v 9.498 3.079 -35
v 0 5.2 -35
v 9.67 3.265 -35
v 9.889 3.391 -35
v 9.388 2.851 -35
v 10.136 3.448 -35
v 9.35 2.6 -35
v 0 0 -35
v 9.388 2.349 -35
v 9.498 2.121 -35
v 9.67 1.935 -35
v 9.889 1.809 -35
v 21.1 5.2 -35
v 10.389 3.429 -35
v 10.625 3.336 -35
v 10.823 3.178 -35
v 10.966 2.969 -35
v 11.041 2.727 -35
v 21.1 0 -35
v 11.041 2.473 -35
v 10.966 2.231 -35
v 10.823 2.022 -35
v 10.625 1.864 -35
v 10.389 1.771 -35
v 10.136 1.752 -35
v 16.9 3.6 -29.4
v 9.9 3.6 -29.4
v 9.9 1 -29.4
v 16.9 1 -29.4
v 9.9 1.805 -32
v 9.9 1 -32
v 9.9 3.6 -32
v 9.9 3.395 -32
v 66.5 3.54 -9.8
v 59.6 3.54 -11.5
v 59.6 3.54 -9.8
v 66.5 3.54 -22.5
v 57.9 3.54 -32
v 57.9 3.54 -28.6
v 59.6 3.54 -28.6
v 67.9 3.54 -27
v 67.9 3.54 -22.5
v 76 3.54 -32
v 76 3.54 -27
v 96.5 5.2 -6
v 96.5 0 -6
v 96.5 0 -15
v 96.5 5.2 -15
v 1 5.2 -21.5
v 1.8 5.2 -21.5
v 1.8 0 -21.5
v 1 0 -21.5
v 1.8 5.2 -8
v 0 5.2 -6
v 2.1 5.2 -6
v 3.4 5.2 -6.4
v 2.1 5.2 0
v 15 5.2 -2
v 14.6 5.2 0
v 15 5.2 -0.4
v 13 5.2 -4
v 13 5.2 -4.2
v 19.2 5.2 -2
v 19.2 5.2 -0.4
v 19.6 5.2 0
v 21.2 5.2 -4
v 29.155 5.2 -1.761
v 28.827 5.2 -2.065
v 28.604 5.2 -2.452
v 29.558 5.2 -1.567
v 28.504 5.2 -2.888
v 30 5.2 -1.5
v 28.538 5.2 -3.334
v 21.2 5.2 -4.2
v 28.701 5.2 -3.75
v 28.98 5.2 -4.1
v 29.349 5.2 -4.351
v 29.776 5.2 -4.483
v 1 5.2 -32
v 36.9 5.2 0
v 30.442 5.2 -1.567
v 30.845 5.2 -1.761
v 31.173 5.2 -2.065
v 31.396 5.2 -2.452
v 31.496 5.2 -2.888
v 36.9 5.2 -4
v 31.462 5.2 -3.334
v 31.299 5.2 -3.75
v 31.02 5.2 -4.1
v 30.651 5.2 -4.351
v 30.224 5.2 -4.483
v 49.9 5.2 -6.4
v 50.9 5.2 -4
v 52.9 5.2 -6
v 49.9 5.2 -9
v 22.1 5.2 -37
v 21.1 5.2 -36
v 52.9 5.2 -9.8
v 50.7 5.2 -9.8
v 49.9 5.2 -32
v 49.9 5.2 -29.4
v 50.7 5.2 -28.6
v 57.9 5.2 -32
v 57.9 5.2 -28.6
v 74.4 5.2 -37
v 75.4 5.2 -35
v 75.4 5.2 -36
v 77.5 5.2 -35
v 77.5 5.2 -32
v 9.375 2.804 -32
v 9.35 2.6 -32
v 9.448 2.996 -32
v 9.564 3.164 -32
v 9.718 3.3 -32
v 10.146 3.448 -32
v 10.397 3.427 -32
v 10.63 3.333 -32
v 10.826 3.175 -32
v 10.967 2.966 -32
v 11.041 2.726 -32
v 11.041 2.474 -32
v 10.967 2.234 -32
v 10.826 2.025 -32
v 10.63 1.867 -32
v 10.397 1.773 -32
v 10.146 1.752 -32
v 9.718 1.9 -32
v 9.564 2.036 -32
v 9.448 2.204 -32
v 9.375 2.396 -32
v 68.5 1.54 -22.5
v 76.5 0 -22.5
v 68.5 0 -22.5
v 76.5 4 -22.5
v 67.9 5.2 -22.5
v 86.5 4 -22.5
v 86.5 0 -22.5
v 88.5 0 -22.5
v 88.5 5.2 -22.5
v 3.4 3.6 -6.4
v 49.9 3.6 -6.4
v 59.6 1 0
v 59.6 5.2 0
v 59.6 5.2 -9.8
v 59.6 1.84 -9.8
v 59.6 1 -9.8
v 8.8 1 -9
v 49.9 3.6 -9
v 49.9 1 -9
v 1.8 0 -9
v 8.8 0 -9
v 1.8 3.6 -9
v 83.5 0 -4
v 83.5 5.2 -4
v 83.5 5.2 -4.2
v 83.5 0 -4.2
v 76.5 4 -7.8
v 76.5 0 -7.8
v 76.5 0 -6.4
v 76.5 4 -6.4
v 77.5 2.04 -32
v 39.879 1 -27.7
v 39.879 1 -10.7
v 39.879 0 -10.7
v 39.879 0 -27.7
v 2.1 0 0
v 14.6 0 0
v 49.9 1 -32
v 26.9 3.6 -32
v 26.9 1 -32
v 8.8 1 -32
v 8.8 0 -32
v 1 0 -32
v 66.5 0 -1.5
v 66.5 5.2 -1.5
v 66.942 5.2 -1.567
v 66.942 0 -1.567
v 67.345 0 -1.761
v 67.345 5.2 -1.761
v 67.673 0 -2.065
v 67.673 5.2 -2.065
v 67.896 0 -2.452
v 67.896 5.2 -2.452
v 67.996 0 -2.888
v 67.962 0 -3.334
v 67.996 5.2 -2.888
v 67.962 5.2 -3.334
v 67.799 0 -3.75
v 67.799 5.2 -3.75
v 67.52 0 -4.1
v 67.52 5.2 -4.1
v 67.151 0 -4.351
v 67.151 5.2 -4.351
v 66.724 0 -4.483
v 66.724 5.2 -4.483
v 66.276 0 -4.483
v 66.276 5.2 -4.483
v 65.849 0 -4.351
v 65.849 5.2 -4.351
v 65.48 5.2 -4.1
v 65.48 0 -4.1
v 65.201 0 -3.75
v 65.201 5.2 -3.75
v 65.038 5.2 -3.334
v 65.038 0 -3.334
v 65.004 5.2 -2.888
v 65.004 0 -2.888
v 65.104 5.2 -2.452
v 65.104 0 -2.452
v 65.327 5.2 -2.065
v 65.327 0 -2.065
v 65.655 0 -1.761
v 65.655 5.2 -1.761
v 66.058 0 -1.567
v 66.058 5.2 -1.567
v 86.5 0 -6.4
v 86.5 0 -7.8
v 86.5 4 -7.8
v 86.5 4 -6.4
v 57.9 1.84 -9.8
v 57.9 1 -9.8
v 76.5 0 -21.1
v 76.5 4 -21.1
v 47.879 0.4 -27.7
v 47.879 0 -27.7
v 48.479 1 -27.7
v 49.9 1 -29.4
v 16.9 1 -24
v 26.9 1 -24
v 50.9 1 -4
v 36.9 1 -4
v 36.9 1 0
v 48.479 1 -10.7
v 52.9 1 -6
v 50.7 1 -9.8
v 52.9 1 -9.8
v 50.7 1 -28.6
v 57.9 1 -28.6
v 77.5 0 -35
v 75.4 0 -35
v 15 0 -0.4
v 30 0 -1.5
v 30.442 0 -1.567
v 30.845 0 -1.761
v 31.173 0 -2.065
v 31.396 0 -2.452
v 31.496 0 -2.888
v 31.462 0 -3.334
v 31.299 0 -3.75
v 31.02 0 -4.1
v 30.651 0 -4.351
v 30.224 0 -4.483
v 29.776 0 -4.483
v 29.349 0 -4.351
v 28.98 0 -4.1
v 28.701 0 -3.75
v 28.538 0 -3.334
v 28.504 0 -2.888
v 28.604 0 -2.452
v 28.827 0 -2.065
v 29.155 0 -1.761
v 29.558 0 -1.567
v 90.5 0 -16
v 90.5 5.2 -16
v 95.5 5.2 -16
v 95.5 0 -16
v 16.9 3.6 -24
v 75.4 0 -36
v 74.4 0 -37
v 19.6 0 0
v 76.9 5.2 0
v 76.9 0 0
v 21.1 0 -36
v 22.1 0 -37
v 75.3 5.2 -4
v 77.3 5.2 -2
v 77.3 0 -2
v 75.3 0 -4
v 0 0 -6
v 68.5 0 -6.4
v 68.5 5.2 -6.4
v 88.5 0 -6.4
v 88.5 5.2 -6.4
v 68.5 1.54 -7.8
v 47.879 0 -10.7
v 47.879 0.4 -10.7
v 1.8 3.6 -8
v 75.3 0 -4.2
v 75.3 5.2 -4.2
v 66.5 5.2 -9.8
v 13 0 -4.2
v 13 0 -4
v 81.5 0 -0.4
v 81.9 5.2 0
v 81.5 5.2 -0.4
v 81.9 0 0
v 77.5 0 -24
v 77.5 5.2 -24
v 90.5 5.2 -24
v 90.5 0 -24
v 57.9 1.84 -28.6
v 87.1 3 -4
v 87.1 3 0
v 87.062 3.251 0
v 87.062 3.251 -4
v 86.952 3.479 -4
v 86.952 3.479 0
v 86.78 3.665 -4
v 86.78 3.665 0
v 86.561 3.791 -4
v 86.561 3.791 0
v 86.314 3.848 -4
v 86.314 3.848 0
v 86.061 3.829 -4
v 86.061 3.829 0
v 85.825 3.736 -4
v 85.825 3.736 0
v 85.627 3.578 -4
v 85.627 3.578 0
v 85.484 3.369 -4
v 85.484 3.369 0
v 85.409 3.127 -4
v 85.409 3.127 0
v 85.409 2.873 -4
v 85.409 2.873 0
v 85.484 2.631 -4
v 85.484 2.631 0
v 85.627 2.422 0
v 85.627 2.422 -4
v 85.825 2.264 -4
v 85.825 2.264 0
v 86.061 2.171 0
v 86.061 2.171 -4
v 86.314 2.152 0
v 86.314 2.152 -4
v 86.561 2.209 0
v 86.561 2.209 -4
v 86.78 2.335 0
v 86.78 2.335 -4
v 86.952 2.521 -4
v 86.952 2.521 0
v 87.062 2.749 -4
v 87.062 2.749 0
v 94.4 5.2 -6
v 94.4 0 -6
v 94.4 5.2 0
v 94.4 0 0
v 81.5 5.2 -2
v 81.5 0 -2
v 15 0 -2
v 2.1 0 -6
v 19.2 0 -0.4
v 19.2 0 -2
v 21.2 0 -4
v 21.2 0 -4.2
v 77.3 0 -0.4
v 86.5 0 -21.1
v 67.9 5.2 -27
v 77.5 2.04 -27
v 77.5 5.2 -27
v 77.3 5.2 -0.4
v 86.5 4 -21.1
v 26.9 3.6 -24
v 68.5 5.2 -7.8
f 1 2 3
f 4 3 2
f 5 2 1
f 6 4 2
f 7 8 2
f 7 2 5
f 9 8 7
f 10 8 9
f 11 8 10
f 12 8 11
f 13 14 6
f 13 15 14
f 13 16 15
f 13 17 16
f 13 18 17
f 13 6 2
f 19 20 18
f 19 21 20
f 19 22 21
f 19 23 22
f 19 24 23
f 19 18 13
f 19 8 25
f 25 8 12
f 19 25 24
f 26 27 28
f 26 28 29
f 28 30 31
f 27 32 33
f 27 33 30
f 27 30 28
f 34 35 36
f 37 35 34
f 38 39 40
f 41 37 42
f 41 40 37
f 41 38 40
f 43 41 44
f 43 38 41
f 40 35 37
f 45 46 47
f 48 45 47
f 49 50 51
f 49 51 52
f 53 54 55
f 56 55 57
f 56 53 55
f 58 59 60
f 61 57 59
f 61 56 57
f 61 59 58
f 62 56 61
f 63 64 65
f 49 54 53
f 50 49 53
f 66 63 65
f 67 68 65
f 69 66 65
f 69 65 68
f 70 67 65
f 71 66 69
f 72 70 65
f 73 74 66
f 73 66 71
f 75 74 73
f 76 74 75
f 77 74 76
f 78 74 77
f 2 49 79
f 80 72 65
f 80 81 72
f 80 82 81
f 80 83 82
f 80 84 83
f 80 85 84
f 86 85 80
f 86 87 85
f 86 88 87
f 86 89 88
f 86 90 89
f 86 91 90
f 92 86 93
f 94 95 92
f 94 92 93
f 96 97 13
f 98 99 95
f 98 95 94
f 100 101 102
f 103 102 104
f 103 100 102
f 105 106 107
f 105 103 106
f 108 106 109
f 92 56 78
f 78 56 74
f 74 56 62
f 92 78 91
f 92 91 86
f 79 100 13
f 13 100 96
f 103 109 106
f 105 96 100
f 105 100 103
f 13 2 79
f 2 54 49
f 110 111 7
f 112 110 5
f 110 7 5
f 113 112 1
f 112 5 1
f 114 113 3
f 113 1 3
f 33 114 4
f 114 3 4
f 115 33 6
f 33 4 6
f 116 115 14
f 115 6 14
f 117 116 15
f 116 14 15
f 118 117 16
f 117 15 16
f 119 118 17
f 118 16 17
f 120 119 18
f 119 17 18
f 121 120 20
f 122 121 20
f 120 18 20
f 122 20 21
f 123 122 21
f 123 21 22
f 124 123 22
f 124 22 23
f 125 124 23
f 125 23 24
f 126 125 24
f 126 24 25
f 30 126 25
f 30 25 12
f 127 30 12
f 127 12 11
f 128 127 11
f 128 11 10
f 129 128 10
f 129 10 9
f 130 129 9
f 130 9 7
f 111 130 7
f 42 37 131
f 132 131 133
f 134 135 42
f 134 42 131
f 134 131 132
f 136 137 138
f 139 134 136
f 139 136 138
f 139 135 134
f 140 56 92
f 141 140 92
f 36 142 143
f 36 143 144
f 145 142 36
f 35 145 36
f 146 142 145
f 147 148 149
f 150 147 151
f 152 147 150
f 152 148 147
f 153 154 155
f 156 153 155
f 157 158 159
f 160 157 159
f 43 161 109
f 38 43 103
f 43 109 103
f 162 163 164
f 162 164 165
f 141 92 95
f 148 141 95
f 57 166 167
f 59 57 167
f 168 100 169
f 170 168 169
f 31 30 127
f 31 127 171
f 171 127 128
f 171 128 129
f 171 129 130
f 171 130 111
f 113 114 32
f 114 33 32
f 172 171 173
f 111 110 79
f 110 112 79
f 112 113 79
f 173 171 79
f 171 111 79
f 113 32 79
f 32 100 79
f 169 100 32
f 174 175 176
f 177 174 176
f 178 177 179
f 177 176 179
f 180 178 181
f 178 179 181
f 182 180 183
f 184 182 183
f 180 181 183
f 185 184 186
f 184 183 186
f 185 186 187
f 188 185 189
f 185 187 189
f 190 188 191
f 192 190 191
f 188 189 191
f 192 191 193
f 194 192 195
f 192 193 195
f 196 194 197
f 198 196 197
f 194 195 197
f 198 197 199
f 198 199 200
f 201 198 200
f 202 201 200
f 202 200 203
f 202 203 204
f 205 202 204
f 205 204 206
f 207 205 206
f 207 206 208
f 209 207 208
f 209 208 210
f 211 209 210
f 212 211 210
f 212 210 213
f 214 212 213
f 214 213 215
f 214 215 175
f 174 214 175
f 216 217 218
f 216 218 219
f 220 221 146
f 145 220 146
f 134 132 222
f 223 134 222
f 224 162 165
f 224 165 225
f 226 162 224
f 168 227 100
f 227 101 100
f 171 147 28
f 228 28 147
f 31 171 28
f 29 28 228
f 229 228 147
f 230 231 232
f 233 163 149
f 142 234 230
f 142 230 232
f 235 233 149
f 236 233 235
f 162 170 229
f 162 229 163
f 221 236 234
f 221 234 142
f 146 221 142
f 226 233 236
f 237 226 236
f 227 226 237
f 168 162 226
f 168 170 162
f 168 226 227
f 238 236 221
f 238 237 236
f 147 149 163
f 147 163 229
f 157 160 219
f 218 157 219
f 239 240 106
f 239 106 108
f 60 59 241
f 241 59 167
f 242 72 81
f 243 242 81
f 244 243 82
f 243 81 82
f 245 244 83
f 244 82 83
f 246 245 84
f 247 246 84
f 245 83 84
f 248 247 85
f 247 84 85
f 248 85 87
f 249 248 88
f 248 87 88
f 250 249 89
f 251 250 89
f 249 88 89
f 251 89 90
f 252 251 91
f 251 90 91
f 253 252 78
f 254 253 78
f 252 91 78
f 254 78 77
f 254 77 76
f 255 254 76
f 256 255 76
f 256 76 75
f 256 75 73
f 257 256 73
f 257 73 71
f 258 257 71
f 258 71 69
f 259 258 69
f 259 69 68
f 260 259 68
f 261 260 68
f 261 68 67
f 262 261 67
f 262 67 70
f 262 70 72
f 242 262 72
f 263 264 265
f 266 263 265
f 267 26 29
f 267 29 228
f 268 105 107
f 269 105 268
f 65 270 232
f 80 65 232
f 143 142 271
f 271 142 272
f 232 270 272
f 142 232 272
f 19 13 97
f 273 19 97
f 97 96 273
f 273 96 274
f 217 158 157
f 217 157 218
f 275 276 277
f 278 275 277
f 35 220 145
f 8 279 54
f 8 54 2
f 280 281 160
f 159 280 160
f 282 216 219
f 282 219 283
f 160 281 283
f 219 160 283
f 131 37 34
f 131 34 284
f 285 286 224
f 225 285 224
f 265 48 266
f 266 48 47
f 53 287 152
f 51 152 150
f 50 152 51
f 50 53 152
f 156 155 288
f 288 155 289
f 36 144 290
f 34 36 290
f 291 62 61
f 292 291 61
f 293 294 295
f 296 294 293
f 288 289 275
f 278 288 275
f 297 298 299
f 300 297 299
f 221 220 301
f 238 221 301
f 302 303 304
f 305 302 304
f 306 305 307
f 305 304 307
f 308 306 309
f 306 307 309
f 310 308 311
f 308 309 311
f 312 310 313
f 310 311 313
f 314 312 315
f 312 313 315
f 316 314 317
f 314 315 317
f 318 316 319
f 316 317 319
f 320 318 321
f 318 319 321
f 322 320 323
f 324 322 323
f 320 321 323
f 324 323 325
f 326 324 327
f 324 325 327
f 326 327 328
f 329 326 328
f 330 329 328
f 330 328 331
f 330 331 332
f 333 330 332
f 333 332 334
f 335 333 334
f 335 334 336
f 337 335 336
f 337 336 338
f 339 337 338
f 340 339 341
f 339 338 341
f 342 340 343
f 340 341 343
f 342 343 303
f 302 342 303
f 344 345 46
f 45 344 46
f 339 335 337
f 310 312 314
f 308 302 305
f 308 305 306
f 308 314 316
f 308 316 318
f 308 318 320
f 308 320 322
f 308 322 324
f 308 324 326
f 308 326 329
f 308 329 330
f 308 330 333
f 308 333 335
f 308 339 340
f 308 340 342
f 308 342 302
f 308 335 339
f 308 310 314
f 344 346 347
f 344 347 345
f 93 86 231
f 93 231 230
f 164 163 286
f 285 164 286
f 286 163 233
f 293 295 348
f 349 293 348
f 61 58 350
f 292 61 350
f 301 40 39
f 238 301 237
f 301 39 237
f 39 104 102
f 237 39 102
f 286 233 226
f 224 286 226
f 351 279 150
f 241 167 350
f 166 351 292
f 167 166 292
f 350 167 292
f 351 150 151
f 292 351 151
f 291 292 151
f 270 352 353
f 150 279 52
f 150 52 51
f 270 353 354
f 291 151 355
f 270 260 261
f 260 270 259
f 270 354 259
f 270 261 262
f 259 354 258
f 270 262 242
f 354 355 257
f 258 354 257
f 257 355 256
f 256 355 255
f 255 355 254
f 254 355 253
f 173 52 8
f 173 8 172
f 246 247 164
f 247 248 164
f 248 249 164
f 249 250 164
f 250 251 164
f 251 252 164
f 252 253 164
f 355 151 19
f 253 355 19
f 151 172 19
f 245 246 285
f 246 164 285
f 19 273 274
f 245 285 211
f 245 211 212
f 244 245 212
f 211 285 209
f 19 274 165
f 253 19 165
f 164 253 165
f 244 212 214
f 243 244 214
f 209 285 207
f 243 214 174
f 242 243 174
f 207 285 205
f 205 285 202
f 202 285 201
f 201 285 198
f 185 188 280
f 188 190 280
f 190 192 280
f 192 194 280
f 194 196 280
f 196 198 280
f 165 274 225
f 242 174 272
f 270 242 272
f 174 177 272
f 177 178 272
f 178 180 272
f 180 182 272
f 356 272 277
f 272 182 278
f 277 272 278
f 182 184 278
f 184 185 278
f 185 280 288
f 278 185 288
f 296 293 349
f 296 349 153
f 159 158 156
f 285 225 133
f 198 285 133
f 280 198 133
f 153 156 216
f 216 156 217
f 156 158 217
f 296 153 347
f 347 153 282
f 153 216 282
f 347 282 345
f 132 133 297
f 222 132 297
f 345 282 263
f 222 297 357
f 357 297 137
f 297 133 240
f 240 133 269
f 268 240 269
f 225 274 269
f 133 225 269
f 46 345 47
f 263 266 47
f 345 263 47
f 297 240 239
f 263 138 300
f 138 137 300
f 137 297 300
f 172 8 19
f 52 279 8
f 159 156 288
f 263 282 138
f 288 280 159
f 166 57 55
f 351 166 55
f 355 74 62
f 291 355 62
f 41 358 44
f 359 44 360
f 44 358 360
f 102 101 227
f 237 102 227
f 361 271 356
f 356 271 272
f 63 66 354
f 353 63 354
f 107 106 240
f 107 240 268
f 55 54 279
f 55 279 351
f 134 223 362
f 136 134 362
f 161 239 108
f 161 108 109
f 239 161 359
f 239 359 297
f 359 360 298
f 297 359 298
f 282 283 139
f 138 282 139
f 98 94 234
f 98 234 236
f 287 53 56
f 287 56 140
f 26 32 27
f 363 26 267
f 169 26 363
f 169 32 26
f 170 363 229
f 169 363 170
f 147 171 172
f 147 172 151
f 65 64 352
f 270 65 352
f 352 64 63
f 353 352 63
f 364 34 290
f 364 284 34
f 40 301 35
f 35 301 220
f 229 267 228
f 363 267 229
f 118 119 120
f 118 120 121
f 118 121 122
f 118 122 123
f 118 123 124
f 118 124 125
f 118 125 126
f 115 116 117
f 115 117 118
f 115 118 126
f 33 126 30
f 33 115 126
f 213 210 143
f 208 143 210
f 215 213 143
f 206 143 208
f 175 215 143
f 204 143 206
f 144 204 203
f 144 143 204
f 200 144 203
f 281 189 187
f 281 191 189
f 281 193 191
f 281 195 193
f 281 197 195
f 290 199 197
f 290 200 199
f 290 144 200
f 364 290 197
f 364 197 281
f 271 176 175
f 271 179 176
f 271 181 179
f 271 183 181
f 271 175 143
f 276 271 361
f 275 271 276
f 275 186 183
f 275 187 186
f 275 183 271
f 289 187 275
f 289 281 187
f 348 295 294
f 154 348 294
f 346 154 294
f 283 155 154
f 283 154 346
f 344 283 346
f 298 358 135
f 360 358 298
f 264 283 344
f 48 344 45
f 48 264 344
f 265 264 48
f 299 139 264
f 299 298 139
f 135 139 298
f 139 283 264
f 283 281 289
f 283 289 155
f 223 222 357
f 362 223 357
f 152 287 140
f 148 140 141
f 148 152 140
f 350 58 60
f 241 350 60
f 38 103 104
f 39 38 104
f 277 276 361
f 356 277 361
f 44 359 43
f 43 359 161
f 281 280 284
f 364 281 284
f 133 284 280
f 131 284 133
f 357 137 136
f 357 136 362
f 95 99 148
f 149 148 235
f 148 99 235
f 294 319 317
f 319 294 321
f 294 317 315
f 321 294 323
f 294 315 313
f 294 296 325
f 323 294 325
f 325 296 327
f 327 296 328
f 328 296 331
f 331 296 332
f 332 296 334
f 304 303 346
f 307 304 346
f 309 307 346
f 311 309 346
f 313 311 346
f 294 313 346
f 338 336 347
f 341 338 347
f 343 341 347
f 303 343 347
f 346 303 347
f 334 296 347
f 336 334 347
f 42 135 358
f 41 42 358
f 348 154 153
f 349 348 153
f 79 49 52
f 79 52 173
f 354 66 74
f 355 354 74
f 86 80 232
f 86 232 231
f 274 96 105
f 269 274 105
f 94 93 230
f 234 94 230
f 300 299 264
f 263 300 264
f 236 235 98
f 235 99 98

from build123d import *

# Parameters (mm, degrees)
SKETCH_1_W           = 96.5
SKETCH_1_H           = 35
EXTRUDE_1_DEPTH      = 5.2
CUT_EXTRUDE_6_DEPTH  = 1.6
CUT_EXTRUDE_7_DEPTH  = 2.6
CUT_EXTRUDE_15_DEPTH = 5
SKETCH_7_W           = 8
SKETCH_7_H           = 17
CUT_EXTRUDE_16_DEPTH = 103.736994311
SKETCH_8_W           = 18.1
SKETCH_8_H           = 16.1
CUT_EXTRUDE_17_DEPTH = 1.66
CUT_EXTRUDE_18_REACH = 104.712
SKETCH_9_W           = 15.2
SKETCH_9_H           = 16.1
CHAMFER_1_SIZE       = 0.6
SKETCH_10_W          = 12.5
SKETCH_10_H          = 12.7
CUT_EXTRUDE_19_DEPTH = 1.66
CHAMFER_2_SIZE       = 0.8
CUT_EXTRUDE_20_DEPTH = 103.782732013
CHAMFER_4_SIZE       = 1
SKETCH_14_W          = 54.3
SKETCH_14_H          = 2
EXTRUDE_2_DEPTH      = 5.2
CHAMFER_5_SIZE       = 1
CUT_EXTRUDE_21_DEPTH = 1.66
CHAMFER_3_SIZE       = 1.5
CHAMFER_6_SIZE       = 1.6
SKETCH_16_W          = 2.1
SKETCH_16_H          = 6
CUT_EXTRUDE_22_DEPTH = 104.480867797
CUT_EXTRUDE_24_DEPTH = 104.480867797
CHAMFER_11_SIZE      = 2
CHAMFER_10_SIZE      = 0.4
CUT_EXTRUDE_START    = -4.2
SKETCH_21_W          = 6.7
SKETCH_21_H          = 9.8
CUT_EXTRUDE_26_DEPTH = 4.2
CHAMFER_9_SIZE       = 1.7
SKETCH_22_W          = 16
SKETCH_22_H          = 4
CUT_EXTRUDE_27_DEPTH = 4.2
CHAMFER_12_SIZE      = 2
SKETCH_24_R          = 1.5
CUT_EXTRUDE_28_DEPTH = 104.480867797
SKETCH_25_R          = 0.85
CUT_EXTRUDE_29_DEPTH = 3
SKETCH_26_R          = 0.85
CUT_EXTRUDE_30_DEPTH = 4
SKETCH_27_W          = 20
SKETCH_27_H          = 16.1
CUT_EXTRUDE_31_DEPTH = 104.480867797
SKETCH_28_W          = 10
SKETCH_28_H          = 1.4
EXTRUDE_3_DEPTH      = 4
CHAMFER_13_SIZE      = 2
CHAMFER_14_SIZE      = 2


# Some blends are built 0.0001 mm under size
with BuildPart() as part:
    # 草图1 → 凸台-拉伸1 (new body)
    with BuildSketch(Plane(origin=(0, 0, 0), x_dir=(1, 0, 0), z_dir=(0, 1, 0))):
        with Locations((48.25, 17.5)):
            Rectangle(SKETCH_1_W, SKETCH_1_H)
    extrude(amount=EXTRUDE_1_DEPTH)

    # 草图4 → 切除-拉伸6 (cut)
    with BuildSketch(Plane(origin=(0, 5.2, 0), x_dir=(1, 0, 0), z_dir=(0, 1, 0))):
        Polygon((1.8, 6.4), (49.9, 6.4), (49.9, 9.8), (57.9, 9.8), (57.9, 28.6), (49.9, 28.6), (49.9, 32), (1.8, 32), align=None)
    extrude(amount=-CUT_EXTRUDE_6_DEPTH, mode=Mode.SUBTRACT)

    # 草图5 → 切除-拉伸7 (cut)
    with BuildSketch(Plane(origin=(0, 3.6, 0), x_dir=(1, 0, 0), z_dir=(0, 1, 0))):
        Polygon((49.9, 9), (1.8, 9), (1.8, 32), (9.9, 32), (9.9, 29.4), (16.9, 29.4), (16.9, 24), (26.9, 24), (26.9, 32), (49.9, 32), (49.9, 28.6), (57.9, 28.6), (57.9, 9.8), (49.9, 9.8), align=None)
    extrude(amount=-CUT_EXTRUDE_7_DEPTH, mode=Mode.SUBTRACT)

    # 草图6 → 切除-拉伸15 (cut, symmetric)
    with BuildSketch(Plane(origin=(0, 1, 0), x_dir=(1, 0, 0), z_dir=(0, 1, 0))):
        Polygon((3.8, 32), (8.8, 32), (8.8, 9), (1.8, 9), (1.8, 21.5), (1, 21.5), (1, 32), align=None)
    extrude(amount=CUT_EXTRUDE_15_DEPTH, both=True, mode=Mode.SUBTRACT)

    # 草图7 → 切除-拉伸16 (cut, through all)
    with BuildSketch(Plane(origin=(0, 1, 0), x_dir=(1, 0, 0), z_dir=(0, 1, 0))):
        with Locations((43.879, 19.2)):
            Rectangle(SKETCH_7_W, SKETCH_7_H)
    extrude(amount=-CUT_EXTRUDE_16_DEPTH, mode=Mode.SUBTRACT)

    # 草图8 → 切除-拉伸17 (cut)
    with BuildSketch(Plane(origin=(0, 5.2, 0), x_dir=(1, 0, 0), z_dir=(0, 1, 0))):
        with Locations((79.45, 14.45)):
            Rectangle(SKETCH_8_W, SKETCH_8_H)
    extrude(amount=-CUT_EXTRUDE_17_DEPTH, mode=Mode.SUBTRACT)

    # 草图9 → 切除-拉伸18 (cut, up to next)
    with BuildSketch(Plane(origin=(0, 3.54, 0), x_dir=(1, 0, 0), z_dir=(0, 1, 0)), mode=Mode.PRIVATE) as cut_extrude_18_sk1:
        with Locations((79.2, 14.45)):
            Rectangle(SKETCH_9_W, SKETCH_9_H)
    cut_extrude_18_tool1 = extrude(cut_extrude_18_sk1.sketch, amount=-CUT_EXTRUDE_18_REACH, mode=Mode.PRIVATE) & part.part
    add(cut_extrude_18_tool1.solids().sort_by_distance((79.2, 3.54, -14.45))[0], mode=Mode.SUBTRACT)

    # 倒角1
    chamfer_1_edges = [part.edges().sort_by_distance(p)[0] for p in [
        (47.879, 1, -19.2),
    ]]
    chamfer(chamfer_1_edges, length=CHAMFER_1_SIZE)

    # 草图10 → 切除-拉伸19 (cut)
    with BuildSketch(Plane(origin=(0, 5.2, 0), x_dir=(1, 0, 0), z_dir=(0, 1, 0))):
        with Locations((64.15, 16.15)):
            Rectangle(SKETCH_10_W, SKETCH_10_H)
    extrude(amount=-CUT_EXTRUDE_19_DEPTH, mode=Mode.SUBTRACT)

    # 倒角2
    chamfer_2_edges = [part.edges().sort_by_distance(p)[0] for p in [
        (49.9, 3.1, -28.6),
        (49.9, 3.1, -9.8),
    ]]
    chamfer(chamfer_2_edges, length=CHAMFER_2_SIZE)

    # 草图12 → 切除-拉伸20 (cut, through all)
    with BuildSketch(Plane(origin=(0, 5.2, 0), x_dir=(1, 0, 0), z_dir=(0, 1, 0))):
        Polygon((96.5, 35), (77.5, 35), (77.5, 24), (90.5, 24), (90.5, 16), (96.5, 16), align=None)
    extrude(amount=-CUT_EXTRUDE_20_DEPTH, mode=Mode.SUBTRACT)

    # 倒角4
    chamfer_4_edges = [part.edges().sort_by_distance(p)[0] for p in [
        (96.5, 2.6, -16),
    ]]
    chamfer(chamfer_4_edges, length=CHAMFER_4_SIZE)

    # 草图14 → 凸台-拉伸2 (add)
    with BuildSketch(Plane(origin=(0, 5.2, 0), x_dir=(1, 0, 0), z_dir=(0, 1, 0))):
        with Locations((48.25, 36)):
            Rectangle(SKETCH_14_W, SKETCH_14_H)
    extrude(amount=-EXTRUDE_2_DEPTH)

    # 倒角5
    chamfer_5_edges = [part.edges().sort_by_distance(p)[0] for p in [
        (21.1, 2.6, -37),
        (75.4, 2.6, -37),
    ]]
    chamfer(chamfer_5_edges, length=CHAMFER_5_SIZE)

    # 草图15 → 切除-拉伸21 (cut)
    with BuildSketch(Plane(origin=(0, 5.2, 0), x_dir=(1, 0, 0), z_dir=(0, 1, 0))):
        Polygon((77.5, 32), (57.9, 32), (57.9, 30.602488817), (57.9, 22.5), (67.9, 22.5), (67.9, 27), (77.5, 27), align=None)
    extrude(amount=-CUT_EXTRUDE_21_DEPTH, mode=Mode.SUBTRACT)

    # 倒角3
    chamfer_3_edges = [part.edges().sort_by_distance(p)[0] for p in [
        (77.5, 3.54, -29.5),
    ]]
    chamfer(chamfer_3_edges, length=CHAMFER_3_SIZE)

    # 倒角6
    chamfer_6_edges = [part.edges().sort_by_distance(p)[0] for p in [
        (1.8, 4.4, -6.4),
    ]]
    chamfer(chamfer_6_edges, length=CHAMFER_6_SIZE)

    # 草图16 → 切除-拉伸22 (cut, through all)
    with BuildSketch(Plane(origin=(0, 5.2, 0), x_dir=(1, 0, 0), z_dir=(0, 1, 0))):
        with Locations((1.05, 3)):
            Rectangle(SKETCH_16_W, SKETCH_16_H)
        with Locations((95.45, 3)):
            Rectangle(SKETCH_16_W, SKETCH_16_H)
    extrude(amount=-CUT_EXTRUDE_22_DEPTH, mode=Mode.SUBTRACT)

    # 草图19 → 切除-拉伸24 (cut, through all)
    with BuildSketch(Plane(origin=(0, 5.2, 0), x_dir=(1, 0, 0), z_dir=(0, 1, 0))):
        Polygon((15, 0), (19.2, 0), (19.2, 2), (21.2, 2), (21.2, 4.2), (13, 4.2), (13, 2), (15, 2), align=None)
        Polygon((77.3, 2), (77.3, 0), (81.5, 0), (81.5, 2), (83.5, 2), (83.5, 4.2), (75.3, 4.2), (75.3, 2), align=None)
    extrude(amount=-CUT_EXTRUDE_24_DEPTH, mode=Mode.SUBTRACT)

    # 倒角11
    chamfer_11_edges = [part.edges().sort_by_distance(p)[0] for p in [
        (83.5, 2.6, -2),
        (75.3, 2.6, -2),
        (21.2, 2.6, -2),
        (13, 2.6, -2),
    ]]
    chamfer(chamfer_11_edges, length=CHAMFER_11_SIZE - 0.0001)  # a hair under: the kernel refuses the full size

    # 倒角10
    chamfer_10_edges = [part.edges().sort_by_distance(p)[0] for p in [
        (19.2, 2.6, 0),
        (15, 2.6, 0),
        (81.5, 2.6, 0),
        (77.3, 2.6, 0),
    ]]
    chamfer(chamfer_10_edges, length=CHAMFER_10_SIZE)

    # 草图21 → 切除-拉伸26 (cut)
    with BuildSketch(Plane(origin=(0, 5.2, 0), x_dir=(1, 0, 0), z_dir=(0, 1, 0)).offset(CUT_EXTRUDE_START)):
        with Locations((56.25, 4.9)):
            Rectangle(SKETCH_21_W, SKETCH_21_H)
    extrude(amount=CUT_EXTRUDE_26_DEPTH, mode=Mode.SUBTRACT)

    # 倒角9
    chamfer_9_edges = [part.edges().sort_by_distance(p)[0] for p in [
        (57.9, 3.54, -19.2),
        (58.75, 3.54, -9.8),
    ]]
    chamfer(chamfer_9_edges, length=CHAMFER_9_SIZE - 0.0001)  # a hair under: the kernel refuses the full size

    # 草图22 → 切除-拉伸27 (cut)
    with BuildSketch(Plane(origin=(0, 5.2, 0), x_dir=(1, 0, 0), z_dir=(0, 1, 0))):
        with Locations((44.9, 2)):
            Rectangle(SKETCH_22_W, SKETCH_22_H)
    extrude(amount=-CUT_EXTRUDE_27_DEPTH, mode=Mode.SUBTRACT)

    # 倒角12
    chamfer_12_edges = [part.edges().sort_by_distance(p)[0] for p in [
        (52.9, 3.1, -4),
    ]]
    chamfer(chamfer_12_edges, length=CHAMFER_12_SIZE)

    # 草图24 → 切除-拉伸28 (cut, through all)
    with BuildSketch(Plane(origin=(0, 5.2, 0), x_dir=(1, 0, 0), z_dir=(0, 1, 0))):
        with Locations(Location((30, 3, 0), (0, 0, 270))):
            Circle(SKETCH_24_R)
        with Locations(Location((66.5, 3, 0), (0, 0, 270))):
            Circle(SKETCH_24_R)
    extrude(amount=-CUT_EXTRUDE_28_DEPTH, mode=Mode.SUBTRACT)

    # 草图25 → 切除-拉伸29 (cut)
    with BuildSketch(Plane(origin=(0, 0, -35), x_dir=(-1, 0, 0), z_dir=(0, 0, -1))):
        with Locations((-10.2, 2.6)):
            Circle(SKETCH_25_R)
    extrude(amount=-CUT_EXTRUDE_29_DEPTH, mode=Mode.SUBTRACT)

    # 草图26 → 切除-拉伸30 (cut)
    with BuildSketch(Plane.XY):
        with Locations((86.25, 3)):
            Circle(SKETCH_26_R)
    extrude(amount=-CUT_EXTRUDE_30_DEPTH, mode=Mode.SUBTRACT)

    # 草图27 → 切除-拉伸31 (cut, through all)
    with BuildSketch(Plane(origin=(0, 5.2, 0), x_dir=(1, 0, 0), z_dir=(0, 1, 0))):
        with Locations((78.5, 14.45)):
            Rectangle(SKETCH_27_W, SKETCH_27_H)
    extrude(amount=-CUT_EXTRUDE_31_DEPTH, mode=Mode.SUBTRACT)

    # 草图28 → 凸台-拉伸3 (add)
    with BuildSketch(Plane.XZ):
        with Locations((81.5, -7.1)):
            Rectangle(SKETCH_28_W, SKETCH_28_H)
        with Locations((81.5, -21.8)):
            Rectangle(SKETCH_28_W, SKETCH_28_H)
    extrude(amount=-EXTRUDE_3_DEPTH)

    # 倒角13
    chamfer_13_edges = [part.edges().sort_by_distance(p)[0] for p in [
        (68.5, 4.37, -9.8),
    ]]
    chamfer(chamfer_13_edges, length=CHAMFER_13_SIZE)

    # 倒角14
    # the kernel refuses this chamfer: 2 mm, written as the material it takes off along each edge
    with BuildSketch(Plane(origin=(68.5, 3.54, -22.5), x_dir=(-0.9996219169112968, 0.027495876610586414, 0), z_dir=(0, 0, 1))) as chamfer_14_piece_1_section:
        Polygon((CHAMFER_14_SIZE * 0.999621916911, CHAMFER_14_SIZE * 0.0274958766106), (-CHAMFER_14_SIZE * 0.0274958766106, CHAMFER_14_SIZE * 0.999621916911), (0, 0), align=None)
    chamfer_14_piece_1 = extrude(amount=19.843365976, mode=Mode.PRIVATE)
    chamfer_14_piece_1 = split(chamfer_14_piece_1, bisect_by=Plane(origin=(63.791666667, 3.073333333, -12.508333333), z_dir=(0.7071067811865476, 0, -0.7071067811865476)), keep=Keep.TOP, mode=Mode.PRIVATE)
    add(chamfer_14_piece_1, mode=Mode.SUBTRACT)


solid = part.part
